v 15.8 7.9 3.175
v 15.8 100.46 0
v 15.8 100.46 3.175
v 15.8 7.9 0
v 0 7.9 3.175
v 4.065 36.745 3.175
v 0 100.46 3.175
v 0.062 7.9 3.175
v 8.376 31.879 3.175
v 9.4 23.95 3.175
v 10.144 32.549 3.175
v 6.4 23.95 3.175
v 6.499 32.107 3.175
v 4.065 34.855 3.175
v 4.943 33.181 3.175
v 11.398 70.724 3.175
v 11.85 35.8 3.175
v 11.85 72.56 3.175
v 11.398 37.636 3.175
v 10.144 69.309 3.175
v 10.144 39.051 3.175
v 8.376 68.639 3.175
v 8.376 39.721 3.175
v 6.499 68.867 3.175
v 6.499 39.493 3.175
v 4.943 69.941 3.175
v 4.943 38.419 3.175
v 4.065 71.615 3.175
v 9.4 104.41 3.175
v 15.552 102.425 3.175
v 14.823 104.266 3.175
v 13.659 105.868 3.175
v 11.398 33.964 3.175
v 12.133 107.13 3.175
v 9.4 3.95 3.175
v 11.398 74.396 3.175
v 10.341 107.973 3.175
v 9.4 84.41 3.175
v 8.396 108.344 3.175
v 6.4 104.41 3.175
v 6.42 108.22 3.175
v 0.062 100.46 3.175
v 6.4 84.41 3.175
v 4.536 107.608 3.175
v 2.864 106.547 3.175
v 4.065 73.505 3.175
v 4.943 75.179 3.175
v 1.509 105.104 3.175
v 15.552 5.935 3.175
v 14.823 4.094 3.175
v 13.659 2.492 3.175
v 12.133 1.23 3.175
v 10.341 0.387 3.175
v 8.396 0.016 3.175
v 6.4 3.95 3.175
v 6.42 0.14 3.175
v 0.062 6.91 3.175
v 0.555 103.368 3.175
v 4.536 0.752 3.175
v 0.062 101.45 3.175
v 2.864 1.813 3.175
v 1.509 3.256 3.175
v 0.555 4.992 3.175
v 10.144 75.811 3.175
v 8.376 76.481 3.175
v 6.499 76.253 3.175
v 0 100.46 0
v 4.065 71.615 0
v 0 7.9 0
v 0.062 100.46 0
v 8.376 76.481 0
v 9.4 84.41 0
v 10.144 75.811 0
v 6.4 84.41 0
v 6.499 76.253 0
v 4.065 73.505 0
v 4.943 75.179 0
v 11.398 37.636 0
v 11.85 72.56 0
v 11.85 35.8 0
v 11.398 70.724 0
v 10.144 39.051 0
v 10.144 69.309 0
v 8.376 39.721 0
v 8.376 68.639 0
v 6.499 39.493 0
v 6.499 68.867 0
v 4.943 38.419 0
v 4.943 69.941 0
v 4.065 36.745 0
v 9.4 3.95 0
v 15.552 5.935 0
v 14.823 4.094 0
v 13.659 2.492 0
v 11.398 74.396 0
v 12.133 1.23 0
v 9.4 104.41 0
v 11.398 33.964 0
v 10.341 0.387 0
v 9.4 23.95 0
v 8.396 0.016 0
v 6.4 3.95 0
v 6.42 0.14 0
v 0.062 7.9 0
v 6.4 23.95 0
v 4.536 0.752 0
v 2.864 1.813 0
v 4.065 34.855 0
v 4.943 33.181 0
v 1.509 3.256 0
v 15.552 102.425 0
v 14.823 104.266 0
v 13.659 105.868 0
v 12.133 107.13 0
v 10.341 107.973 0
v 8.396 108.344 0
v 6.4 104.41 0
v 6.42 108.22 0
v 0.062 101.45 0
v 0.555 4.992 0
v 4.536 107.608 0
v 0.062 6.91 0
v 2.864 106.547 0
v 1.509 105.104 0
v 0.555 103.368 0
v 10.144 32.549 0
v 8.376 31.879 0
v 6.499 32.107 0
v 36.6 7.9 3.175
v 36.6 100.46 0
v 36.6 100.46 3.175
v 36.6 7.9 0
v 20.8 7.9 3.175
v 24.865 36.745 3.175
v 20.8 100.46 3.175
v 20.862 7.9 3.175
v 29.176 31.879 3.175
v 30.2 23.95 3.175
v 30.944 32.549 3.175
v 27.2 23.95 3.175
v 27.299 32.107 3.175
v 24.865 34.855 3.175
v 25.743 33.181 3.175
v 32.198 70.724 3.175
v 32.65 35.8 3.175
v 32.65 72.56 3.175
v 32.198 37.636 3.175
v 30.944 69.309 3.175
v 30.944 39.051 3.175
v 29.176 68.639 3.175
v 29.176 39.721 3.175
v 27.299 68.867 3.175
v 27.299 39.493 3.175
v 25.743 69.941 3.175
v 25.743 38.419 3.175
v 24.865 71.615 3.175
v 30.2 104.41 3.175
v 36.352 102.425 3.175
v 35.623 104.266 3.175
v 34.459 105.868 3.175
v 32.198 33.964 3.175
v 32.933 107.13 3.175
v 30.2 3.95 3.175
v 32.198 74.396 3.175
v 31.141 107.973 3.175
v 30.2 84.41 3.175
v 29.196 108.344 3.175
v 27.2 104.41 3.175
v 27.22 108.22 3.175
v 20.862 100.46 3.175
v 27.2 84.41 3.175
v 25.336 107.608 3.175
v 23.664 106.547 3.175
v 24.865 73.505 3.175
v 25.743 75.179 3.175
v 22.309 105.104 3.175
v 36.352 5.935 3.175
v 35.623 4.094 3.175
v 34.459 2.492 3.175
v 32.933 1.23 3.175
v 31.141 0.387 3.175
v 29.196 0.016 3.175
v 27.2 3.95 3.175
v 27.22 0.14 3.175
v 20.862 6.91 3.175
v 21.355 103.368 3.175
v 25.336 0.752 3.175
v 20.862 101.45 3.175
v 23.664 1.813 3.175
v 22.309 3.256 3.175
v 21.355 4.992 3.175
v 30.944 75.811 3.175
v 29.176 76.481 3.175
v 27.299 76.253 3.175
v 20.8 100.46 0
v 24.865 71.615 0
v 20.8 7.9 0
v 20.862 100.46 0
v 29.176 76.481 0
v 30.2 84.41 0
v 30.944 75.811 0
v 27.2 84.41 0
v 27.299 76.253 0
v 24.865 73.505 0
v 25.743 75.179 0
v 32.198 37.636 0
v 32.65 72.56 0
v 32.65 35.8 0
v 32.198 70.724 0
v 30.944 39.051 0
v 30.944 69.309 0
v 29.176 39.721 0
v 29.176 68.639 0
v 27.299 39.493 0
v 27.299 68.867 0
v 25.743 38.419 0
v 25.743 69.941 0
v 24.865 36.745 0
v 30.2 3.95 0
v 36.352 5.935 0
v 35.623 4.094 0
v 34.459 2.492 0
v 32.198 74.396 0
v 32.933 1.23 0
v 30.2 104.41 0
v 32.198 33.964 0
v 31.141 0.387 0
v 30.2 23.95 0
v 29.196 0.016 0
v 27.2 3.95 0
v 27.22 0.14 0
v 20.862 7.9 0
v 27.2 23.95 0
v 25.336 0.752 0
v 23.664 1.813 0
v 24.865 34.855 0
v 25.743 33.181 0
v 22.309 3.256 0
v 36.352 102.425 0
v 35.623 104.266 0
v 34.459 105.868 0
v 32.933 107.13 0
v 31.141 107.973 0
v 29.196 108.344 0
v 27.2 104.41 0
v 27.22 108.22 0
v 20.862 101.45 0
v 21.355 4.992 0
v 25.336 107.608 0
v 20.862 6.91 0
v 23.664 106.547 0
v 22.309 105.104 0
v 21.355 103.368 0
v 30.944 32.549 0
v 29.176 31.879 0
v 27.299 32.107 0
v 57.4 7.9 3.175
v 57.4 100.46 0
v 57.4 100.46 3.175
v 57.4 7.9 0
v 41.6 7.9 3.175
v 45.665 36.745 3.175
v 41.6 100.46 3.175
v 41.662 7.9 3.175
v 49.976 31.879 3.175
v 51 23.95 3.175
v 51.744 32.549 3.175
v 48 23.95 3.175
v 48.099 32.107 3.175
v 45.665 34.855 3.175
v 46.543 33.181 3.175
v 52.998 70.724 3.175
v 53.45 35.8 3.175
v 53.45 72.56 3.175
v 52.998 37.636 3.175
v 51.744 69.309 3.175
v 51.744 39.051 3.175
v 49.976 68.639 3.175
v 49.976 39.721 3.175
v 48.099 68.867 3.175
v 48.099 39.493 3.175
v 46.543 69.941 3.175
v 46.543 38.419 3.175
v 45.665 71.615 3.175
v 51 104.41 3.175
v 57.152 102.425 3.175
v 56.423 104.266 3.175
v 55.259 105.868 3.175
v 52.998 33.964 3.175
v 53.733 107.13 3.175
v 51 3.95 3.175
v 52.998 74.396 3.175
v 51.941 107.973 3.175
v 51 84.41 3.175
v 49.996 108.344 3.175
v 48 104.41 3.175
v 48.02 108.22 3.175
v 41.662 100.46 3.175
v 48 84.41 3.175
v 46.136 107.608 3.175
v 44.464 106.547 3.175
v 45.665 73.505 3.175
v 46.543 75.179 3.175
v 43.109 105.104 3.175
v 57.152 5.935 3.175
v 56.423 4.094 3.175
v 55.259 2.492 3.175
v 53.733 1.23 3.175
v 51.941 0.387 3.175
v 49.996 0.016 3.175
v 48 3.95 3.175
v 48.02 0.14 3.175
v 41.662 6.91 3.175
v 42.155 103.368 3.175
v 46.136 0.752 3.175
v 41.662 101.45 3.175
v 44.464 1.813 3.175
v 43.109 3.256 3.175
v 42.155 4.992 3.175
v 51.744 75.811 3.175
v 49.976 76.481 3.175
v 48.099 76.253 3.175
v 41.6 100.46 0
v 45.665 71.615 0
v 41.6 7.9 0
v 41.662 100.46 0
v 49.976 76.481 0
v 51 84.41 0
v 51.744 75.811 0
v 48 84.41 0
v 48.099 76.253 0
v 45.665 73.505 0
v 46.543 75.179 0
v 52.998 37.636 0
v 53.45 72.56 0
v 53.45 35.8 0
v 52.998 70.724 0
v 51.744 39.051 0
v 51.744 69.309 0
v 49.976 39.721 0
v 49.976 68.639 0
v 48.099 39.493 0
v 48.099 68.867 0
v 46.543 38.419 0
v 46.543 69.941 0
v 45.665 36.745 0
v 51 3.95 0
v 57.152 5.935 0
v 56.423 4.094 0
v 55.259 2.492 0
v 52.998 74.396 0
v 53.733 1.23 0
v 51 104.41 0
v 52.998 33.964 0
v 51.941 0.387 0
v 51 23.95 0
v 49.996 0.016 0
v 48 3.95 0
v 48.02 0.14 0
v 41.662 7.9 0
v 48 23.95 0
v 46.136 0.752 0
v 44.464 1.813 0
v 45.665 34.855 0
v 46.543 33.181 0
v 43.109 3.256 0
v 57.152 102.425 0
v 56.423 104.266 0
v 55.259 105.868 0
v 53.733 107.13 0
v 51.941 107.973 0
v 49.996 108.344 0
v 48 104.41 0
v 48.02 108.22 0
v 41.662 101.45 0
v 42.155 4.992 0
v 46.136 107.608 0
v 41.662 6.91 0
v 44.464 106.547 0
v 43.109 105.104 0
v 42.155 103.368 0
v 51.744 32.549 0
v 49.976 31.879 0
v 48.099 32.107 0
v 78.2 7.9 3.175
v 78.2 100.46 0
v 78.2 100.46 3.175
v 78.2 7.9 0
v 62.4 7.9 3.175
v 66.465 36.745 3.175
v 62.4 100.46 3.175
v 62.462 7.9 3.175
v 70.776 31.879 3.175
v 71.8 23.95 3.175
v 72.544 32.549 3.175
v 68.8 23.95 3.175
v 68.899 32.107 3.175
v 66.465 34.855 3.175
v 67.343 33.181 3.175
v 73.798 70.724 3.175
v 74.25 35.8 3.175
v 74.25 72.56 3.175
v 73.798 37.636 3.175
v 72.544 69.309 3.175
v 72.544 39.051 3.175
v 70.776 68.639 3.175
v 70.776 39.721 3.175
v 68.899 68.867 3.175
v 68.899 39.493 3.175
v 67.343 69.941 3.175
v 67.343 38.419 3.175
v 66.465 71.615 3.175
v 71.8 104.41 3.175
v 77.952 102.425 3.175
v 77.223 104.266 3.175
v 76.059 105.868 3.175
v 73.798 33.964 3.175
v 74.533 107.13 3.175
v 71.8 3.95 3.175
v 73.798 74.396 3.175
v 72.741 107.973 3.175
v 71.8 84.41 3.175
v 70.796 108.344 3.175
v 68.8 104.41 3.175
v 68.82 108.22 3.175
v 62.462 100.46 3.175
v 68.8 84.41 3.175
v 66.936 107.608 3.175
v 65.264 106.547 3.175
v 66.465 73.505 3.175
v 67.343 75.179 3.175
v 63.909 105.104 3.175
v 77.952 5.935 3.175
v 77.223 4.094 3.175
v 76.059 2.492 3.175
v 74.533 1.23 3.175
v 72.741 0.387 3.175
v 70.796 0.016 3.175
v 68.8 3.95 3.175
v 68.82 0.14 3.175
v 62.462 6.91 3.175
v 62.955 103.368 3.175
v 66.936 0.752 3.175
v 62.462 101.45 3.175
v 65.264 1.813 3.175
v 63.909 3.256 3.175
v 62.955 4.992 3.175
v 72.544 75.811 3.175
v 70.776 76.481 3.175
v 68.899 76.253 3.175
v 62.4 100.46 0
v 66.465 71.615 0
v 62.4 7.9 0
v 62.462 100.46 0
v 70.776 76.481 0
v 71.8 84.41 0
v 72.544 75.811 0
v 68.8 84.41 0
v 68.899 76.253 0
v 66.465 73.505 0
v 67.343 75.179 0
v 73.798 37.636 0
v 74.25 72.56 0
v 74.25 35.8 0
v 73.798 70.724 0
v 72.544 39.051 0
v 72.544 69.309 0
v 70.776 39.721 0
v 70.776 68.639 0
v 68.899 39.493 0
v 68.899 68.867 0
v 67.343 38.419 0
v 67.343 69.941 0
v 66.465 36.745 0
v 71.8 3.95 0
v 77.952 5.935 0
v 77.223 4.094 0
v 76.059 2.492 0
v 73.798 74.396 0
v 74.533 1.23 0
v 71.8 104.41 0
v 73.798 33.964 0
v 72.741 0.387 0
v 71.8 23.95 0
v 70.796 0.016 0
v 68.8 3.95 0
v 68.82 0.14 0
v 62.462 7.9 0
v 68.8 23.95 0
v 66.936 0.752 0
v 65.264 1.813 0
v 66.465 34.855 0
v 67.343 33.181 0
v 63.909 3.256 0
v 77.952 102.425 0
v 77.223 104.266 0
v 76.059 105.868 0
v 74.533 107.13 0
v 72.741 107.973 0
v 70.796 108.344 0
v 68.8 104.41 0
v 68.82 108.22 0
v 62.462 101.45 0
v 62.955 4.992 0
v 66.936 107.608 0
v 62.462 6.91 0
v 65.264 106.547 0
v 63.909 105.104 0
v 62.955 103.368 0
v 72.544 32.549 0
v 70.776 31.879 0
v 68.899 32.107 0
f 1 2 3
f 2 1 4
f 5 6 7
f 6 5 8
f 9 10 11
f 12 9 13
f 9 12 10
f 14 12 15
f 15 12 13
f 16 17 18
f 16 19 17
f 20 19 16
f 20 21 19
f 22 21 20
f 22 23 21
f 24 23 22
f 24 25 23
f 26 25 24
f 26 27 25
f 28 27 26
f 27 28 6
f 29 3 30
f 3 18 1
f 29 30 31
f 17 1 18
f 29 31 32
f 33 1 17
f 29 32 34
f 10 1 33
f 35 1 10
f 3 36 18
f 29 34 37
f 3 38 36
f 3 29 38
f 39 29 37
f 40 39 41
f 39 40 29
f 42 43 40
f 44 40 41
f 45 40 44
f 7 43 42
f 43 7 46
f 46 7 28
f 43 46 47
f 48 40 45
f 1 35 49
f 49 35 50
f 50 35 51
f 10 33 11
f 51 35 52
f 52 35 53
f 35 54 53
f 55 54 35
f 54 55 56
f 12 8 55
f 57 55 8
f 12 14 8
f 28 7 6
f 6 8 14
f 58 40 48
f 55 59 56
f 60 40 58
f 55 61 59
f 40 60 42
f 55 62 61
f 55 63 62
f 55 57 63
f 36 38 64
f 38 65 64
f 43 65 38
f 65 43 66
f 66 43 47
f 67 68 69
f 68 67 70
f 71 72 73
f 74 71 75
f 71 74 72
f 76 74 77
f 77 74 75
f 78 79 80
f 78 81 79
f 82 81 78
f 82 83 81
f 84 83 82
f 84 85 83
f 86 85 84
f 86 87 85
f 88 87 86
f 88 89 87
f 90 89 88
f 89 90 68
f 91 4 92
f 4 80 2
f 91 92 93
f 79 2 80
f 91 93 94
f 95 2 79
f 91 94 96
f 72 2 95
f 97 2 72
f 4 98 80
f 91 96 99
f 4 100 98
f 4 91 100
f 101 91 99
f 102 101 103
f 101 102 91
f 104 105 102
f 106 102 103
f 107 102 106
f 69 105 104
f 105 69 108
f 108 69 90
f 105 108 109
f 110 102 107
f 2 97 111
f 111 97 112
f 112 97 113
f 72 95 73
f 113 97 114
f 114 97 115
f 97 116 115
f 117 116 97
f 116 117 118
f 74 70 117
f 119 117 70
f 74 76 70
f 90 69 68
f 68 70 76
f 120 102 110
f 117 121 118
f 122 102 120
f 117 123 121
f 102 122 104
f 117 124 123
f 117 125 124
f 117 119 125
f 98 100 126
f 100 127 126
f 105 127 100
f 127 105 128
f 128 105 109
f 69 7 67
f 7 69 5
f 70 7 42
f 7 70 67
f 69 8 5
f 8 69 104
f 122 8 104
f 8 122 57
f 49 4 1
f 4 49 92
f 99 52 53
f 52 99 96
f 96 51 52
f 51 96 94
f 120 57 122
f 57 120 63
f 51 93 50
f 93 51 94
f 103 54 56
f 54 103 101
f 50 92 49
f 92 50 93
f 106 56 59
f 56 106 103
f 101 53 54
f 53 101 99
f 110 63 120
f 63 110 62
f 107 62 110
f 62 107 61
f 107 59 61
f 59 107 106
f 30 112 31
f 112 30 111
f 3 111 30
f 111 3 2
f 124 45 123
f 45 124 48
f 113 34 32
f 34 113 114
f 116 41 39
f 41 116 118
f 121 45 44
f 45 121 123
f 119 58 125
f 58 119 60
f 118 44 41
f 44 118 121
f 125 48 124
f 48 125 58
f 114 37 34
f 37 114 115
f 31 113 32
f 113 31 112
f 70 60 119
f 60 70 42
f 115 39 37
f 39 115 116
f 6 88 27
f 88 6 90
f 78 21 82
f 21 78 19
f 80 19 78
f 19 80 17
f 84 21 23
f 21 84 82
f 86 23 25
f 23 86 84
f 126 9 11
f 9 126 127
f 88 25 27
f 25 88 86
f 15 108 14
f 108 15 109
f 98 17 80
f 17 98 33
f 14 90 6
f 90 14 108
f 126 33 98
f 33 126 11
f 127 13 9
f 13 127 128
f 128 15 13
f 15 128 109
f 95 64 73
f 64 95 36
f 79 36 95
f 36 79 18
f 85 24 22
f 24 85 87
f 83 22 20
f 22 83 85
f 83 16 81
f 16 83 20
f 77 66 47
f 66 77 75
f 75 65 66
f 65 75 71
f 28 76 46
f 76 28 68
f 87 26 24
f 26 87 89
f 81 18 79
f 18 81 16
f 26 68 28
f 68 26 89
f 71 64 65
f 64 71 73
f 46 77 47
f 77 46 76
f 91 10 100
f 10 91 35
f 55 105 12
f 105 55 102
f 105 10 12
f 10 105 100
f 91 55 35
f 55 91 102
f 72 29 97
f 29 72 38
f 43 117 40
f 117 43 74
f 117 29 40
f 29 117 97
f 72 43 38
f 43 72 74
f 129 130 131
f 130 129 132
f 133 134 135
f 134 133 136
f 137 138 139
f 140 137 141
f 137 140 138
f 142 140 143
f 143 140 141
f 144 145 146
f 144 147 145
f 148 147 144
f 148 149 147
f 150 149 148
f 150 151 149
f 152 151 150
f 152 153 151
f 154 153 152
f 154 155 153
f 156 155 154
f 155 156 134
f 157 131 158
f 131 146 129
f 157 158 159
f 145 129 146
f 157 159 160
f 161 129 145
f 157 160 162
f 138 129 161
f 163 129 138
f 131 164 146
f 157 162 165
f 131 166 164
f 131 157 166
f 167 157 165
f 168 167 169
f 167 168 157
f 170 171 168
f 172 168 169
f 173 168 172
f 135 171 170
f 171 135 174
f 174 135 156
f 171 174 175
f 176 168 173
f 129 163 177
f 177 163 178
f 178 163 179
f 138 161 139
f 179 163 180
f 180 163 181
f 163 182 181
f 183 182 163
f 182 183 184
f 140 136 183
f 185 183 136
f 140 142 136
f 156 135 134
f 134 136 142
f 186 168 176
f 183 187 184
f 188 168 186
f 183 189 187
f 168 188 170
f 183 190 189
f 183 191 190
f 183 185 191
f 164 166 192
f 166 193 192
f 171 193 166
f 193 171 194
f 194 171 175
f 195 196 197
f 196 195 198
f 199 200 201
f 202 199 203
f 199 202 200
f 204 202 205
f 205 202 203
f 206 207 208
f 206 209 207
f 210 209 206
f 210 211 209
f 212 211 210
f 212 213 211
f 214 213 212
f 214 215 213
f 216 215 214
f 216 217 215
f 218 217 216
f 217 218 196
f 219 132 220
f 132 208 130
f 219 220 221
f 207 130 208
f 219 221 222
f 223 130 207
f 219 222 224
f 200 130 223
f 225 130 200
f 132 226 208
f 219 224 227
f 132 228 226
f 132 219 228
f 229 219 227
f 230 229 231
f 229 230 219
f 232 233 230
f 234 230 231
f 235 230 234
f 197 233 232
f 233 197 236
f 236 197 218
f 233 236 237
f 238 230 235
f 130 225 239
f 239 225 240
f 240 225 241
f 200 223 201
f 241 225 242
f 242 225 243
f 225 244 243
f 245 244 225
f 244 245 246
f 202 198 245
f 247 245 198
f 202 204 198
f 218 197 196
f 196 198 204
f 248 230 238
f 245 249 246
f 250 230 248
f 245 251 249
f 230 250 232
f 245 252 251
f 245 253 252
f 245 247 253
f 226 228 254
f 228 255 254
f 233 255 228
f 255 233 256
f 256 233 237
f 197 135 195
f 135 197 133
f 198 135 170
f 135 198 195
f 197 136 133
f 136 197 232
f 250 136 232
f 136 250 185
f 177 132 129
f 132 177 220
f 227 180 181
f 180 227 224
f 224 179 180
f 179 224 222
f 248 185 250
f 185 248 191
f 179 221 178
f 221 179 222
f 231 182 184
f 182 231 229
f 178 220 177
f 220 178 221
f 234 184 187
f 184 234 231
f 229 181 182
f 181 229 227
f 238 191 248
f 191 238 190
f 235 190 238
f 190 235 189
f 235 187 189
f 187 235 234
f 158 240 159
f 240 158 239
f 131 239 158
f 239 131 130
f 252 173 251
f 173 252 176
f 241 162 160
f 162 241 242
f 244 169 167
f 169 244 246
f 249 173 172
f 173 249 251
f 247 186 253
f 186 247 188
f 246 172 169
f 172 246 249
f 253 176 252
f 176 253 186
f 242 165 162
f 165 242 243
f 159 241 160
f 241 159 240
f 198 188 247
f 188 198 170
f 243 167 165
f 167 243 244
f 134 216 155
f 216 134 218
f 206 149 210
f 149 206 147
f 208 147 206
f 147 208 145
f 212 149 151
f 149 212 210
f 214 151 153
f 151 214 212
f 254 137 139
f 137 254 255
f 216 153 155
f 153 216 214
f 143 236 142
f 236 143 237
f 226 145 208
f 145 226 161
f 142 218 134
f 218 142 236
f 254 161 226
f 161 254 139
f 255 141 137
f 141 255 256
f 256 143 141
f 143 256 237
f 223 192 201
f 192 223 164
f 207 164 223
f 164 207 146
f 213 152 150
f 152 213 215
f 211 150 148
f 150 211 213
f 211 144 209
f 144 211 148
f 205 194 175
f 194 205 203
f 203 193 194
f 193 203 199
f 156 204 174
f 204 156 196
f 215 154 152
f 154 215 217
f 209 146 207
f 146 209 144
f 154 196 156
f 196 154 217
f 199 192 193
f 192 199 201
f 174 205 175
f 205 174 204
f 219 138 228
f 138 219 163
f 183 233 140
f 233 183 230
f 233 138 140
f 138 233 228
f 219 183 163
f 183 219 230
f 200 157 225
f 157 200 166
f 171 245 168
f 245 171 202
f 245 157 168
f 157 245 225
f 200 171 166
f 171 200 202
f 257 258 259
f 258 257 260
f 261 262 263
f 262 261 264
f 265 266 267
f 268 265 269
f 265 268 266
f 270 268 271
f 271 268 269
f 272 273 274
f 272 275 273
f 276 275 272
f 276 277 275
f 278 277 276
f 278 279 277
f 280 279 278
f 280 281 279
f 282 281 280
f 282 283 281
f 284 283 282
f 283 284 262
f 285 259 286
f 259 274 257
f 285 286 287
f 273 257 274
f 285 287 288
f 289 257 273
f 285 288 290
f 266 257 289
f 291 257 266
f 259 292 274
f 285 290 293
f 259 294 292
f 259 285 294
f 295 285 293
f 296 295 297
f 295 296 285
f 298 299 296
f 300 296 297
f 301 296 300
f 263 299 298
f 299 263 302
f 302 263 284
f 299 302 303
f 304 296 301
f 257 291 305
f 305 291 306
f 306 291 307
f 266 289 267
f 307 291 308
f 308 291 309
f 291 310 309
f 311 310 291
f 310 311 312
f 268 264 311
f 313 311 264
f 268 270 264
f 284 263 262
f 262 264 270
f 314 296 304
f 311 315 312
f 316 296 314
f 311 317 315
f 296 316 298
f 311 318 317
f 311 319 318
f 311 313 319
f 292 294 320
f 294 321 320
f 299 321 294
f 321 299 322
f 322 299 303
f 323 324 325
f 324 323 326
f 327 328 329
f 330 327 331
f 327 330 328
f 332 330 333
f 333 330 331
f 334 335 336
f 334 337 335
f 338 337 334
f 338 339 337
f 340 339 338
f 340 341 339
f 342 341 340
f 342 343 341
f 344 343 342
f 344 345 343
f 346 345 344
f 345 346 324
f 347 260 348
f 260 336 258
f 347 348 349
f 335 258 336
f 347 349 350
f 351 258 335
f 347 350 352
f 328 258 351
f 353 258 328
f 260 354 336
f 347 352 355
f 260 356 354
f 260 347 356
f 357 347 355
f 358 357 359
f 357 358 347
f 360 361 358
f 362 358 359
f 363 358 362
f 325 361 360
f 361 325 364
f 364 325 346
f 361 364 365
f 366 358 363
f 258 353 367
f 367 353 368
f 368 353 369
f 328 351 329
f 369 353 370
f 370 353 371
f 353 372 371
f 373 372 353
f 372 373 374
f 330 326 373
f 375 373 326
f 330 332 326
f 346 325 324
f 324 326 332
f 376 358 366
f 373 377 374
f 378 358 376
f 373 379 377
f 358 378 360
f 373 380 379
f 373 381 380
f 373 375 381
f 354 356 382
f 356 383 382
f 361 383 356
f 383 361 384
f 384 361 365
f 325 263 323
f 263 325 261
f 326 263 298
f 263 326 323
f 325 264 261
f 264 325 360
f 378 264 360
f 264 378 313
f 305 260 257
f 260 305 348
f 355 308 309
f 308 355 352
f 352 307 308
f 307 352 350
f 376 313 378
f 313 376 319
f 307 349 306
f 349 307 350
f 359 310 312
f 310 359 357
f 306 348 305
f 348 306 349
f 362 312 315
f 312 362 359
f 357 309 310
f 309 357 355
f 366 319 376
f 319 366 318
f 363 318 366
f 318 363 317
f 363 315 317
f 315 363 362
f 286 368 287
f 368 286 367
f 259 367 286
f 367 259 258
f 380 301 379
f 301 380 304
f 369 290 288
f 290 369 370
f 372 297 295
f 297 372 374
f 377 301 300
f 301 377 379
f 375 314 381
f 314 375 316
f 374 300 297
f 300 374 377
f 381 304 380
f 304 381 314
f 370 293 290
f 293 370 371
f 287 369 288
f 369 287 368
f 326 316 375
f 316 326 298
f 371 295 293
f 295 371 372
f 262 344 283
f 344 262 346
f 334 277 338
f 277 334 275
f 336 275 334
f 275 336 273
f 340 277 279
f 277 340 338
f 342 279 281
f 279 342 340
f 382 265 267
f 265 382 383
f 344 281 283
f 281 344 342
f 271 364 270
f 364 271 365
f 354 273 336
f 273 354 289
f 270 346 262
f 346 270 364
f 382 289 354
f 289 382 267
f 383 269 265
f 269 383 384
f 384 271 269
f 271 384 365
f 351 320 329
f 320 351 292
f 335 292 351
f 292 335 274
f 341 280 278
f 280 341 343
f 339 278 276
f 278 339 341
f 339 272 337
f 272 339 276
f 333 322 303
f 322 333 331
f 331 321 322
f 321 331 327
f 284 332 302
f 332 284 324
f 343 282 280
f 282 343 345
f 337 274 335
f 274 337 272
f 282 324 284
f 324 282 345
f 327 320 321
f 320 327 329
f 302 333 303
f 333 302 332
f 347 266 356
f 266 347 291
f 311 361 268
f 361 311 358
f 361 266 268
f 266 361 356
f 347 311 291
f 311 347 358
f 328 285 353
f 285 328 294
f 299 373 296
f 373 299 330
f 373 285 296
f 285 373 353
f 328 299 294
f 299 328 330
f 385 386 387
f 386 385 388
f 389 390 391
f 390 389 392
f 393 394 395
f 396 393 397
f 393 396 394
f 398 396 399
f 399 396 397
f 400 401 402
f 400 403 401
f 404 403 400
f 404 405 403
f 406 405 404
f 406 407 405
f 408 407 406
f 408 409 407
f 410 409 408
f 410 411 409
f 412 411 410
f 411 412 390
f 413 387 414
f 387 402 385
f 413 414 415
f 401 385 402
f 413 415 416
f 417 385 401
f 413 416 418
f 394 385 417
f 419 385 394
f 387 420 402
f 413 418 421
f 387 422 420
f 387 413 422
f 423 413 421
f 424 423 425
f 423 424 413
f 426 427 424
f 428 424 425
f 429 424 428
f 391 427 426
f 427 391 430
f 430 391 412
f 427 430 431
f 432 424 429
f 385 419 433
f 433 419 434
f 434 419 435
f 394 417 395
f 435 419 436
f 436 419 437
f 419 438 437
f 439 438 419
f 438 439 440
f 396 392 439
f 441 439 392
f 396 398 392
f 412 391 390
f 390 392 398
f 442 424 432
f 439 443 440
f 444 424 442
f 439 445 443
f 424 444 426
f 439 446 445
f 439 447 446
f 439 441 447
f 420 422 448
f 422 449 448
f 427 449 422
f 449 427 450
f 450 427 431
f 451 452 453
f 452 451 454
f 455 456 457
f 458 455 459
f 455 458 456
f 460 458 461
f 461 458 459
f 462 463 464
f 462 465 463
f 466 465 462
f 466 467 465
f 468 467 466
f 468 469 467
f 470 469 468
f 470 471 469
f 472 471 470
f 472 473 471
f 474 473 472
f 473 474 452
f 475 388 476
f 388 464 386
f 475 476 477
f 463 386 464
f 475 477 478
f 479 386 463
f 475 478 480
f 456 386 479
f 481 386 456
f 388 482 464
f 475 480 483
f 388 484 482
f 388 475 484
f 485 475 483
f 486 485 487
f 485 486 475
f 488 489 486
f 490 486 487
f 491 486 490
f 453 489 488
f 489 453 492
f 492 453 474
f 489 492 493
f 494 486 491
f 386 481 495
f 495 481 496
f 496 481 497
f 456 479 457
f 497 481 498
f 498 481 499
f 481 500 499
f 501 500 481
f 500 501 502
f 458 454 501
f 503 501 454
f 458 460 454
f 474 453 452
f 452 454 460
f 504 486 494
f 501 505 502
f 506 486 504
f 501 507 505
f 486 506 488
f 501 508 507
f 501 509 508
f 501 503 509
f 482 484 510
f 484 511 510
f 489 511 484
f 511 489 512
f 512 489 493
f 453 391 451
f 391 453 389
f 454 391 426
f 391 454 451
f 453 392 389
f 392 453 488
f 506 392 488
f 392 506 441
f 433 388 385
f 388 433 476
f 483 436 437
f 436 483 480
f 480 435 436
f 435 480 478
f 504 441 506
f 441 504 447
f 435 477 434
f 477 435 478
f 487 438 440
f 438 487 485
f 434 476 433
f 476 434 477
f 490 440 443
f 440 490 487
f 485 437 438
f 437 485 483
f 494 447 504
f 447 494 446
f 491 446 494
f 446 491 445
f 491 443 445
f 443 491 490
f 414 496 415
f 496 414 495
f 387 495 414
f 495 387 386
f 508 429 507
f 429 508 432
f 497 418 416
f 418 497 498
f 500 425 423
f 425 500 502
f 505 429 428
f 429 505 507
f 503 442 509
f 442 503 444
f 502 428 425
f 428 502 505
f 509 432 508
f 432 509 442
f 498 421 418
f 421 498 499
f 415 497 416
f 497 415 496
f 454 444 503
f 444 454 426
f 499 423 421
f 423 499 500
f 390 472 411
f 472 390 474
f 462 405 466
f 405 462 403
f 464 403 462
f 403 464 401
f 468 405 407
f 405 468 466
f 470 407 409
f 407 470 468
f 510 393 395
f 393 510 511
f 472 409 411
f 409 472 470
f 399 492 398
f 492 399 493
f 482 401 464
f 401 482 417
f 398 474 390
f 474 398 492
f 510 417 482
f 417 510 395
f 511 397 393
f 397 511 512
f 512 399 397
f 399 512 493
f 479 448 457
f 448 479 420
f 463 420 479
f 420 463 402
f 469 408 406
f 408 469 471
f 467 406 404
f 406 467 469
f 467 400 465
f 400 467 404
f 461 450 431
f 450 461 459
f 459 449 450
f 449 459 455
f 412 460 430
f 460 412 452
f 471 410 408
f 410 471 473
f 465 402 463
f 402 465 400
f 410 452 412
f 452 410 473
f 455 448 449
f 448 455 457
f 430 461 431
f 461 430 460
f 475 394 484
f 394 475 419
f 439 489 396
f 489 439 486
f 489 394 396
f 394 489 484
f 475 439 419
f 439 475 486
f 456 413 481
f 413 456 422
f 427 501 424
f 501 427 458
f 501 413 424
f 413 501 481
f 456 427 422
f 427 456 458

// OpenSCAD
$rail_w = 14.76;
$bearing_r = 11;
$bearing_hole_r = 7.9/2;
$flat_thick = 25.4/8;
$slot_w = 3;
$slot_l = 20;
$slot_inset = $bearing_hole_r;
$block_l = $rail_w + $bearing_r * 2 + $bearing_hole_r*4 + 40;

module bearing_mount_body () {
   union () {
      translate([0,$bearing_hole_r*2, 0]) {
		      cube([$bearing_hole_r*4, 
                $block_l,
                $flat_thick]);
      }
      translate([$bearing_hole_r*2,$bearing_hole_r*2,0]) {
            cylinder(r=$bearing_hole_r*2, h=$flat_thick);
      }
      translate([$bearing_hole_r*2,
                 $bearing_hole_r*2 + $block_l,0]) {
            cylinder(r=$bearing_hole_r*2, h=$flat_thick);
      }
   }
}

module bearing_mount () {
      difference () {
          bearing_mount_body();
          // lower bolt hole
          translate([$bearing_hole_r*2,
                    $bearing_hole_r*2 + ($block_l)/2 - 
                          ($rail_w/2 + $bearing_r),
                    -1]) {
              cylinder(r=$bearing_hole_r, h=$flat_thick+2);
          }
          // upper bolt hole
          translate([$bearing_hole_r*2,
                     $bearing_hole_r*2 + ($block_l)/2 + 
                         ($rail_w/2 + $bearing_r),
                     -1]) {
            cylinder(r=$bearing_hole_r, h=$flat_thick+2);
          }
          // lower slot
			translate([$bearing_hole_r*2 - $slot_w/2,
                    $slot_inset,
                    -1]) {
             cube([$slot_w, $slot_l, $flat_thick+2]); 
          }
          // upper slot
			translate([$bearing_hole_r*2 - $slot_w/2, 
                     $bearing_hole_r*2 + ($block_l) + 
                         $bearing_hole_r*2 - ($slot_l + 
                         $slot_inset),
                    -1]) {
             cube([$slot_w, $slot_l, $flat_thick+2]); 
          }


      }
}

$margin_space = 5;

module make_mounts () {
	translate([0,0,0]) {
		bearing_mount();
	}
	translate([$bearing_hole_r*4 + $margin_space,0,0]) {
		bearing_mount();
	}
	translate([2* ($bearing_hole_r*4 + $margin_space),0,0]) {
		bearing_mount();
	}
	translate([3* ($bearing_hole_r*4 + $margin_space),0,0]) {
		bearing_mount();
	}	
}

$2d = 0;
if ($2d) {
    projection(cut=true)
       translate([0,0,0]) rotate([0,0,0])
         make_mounts();
} else {
    make_mounts();
}
